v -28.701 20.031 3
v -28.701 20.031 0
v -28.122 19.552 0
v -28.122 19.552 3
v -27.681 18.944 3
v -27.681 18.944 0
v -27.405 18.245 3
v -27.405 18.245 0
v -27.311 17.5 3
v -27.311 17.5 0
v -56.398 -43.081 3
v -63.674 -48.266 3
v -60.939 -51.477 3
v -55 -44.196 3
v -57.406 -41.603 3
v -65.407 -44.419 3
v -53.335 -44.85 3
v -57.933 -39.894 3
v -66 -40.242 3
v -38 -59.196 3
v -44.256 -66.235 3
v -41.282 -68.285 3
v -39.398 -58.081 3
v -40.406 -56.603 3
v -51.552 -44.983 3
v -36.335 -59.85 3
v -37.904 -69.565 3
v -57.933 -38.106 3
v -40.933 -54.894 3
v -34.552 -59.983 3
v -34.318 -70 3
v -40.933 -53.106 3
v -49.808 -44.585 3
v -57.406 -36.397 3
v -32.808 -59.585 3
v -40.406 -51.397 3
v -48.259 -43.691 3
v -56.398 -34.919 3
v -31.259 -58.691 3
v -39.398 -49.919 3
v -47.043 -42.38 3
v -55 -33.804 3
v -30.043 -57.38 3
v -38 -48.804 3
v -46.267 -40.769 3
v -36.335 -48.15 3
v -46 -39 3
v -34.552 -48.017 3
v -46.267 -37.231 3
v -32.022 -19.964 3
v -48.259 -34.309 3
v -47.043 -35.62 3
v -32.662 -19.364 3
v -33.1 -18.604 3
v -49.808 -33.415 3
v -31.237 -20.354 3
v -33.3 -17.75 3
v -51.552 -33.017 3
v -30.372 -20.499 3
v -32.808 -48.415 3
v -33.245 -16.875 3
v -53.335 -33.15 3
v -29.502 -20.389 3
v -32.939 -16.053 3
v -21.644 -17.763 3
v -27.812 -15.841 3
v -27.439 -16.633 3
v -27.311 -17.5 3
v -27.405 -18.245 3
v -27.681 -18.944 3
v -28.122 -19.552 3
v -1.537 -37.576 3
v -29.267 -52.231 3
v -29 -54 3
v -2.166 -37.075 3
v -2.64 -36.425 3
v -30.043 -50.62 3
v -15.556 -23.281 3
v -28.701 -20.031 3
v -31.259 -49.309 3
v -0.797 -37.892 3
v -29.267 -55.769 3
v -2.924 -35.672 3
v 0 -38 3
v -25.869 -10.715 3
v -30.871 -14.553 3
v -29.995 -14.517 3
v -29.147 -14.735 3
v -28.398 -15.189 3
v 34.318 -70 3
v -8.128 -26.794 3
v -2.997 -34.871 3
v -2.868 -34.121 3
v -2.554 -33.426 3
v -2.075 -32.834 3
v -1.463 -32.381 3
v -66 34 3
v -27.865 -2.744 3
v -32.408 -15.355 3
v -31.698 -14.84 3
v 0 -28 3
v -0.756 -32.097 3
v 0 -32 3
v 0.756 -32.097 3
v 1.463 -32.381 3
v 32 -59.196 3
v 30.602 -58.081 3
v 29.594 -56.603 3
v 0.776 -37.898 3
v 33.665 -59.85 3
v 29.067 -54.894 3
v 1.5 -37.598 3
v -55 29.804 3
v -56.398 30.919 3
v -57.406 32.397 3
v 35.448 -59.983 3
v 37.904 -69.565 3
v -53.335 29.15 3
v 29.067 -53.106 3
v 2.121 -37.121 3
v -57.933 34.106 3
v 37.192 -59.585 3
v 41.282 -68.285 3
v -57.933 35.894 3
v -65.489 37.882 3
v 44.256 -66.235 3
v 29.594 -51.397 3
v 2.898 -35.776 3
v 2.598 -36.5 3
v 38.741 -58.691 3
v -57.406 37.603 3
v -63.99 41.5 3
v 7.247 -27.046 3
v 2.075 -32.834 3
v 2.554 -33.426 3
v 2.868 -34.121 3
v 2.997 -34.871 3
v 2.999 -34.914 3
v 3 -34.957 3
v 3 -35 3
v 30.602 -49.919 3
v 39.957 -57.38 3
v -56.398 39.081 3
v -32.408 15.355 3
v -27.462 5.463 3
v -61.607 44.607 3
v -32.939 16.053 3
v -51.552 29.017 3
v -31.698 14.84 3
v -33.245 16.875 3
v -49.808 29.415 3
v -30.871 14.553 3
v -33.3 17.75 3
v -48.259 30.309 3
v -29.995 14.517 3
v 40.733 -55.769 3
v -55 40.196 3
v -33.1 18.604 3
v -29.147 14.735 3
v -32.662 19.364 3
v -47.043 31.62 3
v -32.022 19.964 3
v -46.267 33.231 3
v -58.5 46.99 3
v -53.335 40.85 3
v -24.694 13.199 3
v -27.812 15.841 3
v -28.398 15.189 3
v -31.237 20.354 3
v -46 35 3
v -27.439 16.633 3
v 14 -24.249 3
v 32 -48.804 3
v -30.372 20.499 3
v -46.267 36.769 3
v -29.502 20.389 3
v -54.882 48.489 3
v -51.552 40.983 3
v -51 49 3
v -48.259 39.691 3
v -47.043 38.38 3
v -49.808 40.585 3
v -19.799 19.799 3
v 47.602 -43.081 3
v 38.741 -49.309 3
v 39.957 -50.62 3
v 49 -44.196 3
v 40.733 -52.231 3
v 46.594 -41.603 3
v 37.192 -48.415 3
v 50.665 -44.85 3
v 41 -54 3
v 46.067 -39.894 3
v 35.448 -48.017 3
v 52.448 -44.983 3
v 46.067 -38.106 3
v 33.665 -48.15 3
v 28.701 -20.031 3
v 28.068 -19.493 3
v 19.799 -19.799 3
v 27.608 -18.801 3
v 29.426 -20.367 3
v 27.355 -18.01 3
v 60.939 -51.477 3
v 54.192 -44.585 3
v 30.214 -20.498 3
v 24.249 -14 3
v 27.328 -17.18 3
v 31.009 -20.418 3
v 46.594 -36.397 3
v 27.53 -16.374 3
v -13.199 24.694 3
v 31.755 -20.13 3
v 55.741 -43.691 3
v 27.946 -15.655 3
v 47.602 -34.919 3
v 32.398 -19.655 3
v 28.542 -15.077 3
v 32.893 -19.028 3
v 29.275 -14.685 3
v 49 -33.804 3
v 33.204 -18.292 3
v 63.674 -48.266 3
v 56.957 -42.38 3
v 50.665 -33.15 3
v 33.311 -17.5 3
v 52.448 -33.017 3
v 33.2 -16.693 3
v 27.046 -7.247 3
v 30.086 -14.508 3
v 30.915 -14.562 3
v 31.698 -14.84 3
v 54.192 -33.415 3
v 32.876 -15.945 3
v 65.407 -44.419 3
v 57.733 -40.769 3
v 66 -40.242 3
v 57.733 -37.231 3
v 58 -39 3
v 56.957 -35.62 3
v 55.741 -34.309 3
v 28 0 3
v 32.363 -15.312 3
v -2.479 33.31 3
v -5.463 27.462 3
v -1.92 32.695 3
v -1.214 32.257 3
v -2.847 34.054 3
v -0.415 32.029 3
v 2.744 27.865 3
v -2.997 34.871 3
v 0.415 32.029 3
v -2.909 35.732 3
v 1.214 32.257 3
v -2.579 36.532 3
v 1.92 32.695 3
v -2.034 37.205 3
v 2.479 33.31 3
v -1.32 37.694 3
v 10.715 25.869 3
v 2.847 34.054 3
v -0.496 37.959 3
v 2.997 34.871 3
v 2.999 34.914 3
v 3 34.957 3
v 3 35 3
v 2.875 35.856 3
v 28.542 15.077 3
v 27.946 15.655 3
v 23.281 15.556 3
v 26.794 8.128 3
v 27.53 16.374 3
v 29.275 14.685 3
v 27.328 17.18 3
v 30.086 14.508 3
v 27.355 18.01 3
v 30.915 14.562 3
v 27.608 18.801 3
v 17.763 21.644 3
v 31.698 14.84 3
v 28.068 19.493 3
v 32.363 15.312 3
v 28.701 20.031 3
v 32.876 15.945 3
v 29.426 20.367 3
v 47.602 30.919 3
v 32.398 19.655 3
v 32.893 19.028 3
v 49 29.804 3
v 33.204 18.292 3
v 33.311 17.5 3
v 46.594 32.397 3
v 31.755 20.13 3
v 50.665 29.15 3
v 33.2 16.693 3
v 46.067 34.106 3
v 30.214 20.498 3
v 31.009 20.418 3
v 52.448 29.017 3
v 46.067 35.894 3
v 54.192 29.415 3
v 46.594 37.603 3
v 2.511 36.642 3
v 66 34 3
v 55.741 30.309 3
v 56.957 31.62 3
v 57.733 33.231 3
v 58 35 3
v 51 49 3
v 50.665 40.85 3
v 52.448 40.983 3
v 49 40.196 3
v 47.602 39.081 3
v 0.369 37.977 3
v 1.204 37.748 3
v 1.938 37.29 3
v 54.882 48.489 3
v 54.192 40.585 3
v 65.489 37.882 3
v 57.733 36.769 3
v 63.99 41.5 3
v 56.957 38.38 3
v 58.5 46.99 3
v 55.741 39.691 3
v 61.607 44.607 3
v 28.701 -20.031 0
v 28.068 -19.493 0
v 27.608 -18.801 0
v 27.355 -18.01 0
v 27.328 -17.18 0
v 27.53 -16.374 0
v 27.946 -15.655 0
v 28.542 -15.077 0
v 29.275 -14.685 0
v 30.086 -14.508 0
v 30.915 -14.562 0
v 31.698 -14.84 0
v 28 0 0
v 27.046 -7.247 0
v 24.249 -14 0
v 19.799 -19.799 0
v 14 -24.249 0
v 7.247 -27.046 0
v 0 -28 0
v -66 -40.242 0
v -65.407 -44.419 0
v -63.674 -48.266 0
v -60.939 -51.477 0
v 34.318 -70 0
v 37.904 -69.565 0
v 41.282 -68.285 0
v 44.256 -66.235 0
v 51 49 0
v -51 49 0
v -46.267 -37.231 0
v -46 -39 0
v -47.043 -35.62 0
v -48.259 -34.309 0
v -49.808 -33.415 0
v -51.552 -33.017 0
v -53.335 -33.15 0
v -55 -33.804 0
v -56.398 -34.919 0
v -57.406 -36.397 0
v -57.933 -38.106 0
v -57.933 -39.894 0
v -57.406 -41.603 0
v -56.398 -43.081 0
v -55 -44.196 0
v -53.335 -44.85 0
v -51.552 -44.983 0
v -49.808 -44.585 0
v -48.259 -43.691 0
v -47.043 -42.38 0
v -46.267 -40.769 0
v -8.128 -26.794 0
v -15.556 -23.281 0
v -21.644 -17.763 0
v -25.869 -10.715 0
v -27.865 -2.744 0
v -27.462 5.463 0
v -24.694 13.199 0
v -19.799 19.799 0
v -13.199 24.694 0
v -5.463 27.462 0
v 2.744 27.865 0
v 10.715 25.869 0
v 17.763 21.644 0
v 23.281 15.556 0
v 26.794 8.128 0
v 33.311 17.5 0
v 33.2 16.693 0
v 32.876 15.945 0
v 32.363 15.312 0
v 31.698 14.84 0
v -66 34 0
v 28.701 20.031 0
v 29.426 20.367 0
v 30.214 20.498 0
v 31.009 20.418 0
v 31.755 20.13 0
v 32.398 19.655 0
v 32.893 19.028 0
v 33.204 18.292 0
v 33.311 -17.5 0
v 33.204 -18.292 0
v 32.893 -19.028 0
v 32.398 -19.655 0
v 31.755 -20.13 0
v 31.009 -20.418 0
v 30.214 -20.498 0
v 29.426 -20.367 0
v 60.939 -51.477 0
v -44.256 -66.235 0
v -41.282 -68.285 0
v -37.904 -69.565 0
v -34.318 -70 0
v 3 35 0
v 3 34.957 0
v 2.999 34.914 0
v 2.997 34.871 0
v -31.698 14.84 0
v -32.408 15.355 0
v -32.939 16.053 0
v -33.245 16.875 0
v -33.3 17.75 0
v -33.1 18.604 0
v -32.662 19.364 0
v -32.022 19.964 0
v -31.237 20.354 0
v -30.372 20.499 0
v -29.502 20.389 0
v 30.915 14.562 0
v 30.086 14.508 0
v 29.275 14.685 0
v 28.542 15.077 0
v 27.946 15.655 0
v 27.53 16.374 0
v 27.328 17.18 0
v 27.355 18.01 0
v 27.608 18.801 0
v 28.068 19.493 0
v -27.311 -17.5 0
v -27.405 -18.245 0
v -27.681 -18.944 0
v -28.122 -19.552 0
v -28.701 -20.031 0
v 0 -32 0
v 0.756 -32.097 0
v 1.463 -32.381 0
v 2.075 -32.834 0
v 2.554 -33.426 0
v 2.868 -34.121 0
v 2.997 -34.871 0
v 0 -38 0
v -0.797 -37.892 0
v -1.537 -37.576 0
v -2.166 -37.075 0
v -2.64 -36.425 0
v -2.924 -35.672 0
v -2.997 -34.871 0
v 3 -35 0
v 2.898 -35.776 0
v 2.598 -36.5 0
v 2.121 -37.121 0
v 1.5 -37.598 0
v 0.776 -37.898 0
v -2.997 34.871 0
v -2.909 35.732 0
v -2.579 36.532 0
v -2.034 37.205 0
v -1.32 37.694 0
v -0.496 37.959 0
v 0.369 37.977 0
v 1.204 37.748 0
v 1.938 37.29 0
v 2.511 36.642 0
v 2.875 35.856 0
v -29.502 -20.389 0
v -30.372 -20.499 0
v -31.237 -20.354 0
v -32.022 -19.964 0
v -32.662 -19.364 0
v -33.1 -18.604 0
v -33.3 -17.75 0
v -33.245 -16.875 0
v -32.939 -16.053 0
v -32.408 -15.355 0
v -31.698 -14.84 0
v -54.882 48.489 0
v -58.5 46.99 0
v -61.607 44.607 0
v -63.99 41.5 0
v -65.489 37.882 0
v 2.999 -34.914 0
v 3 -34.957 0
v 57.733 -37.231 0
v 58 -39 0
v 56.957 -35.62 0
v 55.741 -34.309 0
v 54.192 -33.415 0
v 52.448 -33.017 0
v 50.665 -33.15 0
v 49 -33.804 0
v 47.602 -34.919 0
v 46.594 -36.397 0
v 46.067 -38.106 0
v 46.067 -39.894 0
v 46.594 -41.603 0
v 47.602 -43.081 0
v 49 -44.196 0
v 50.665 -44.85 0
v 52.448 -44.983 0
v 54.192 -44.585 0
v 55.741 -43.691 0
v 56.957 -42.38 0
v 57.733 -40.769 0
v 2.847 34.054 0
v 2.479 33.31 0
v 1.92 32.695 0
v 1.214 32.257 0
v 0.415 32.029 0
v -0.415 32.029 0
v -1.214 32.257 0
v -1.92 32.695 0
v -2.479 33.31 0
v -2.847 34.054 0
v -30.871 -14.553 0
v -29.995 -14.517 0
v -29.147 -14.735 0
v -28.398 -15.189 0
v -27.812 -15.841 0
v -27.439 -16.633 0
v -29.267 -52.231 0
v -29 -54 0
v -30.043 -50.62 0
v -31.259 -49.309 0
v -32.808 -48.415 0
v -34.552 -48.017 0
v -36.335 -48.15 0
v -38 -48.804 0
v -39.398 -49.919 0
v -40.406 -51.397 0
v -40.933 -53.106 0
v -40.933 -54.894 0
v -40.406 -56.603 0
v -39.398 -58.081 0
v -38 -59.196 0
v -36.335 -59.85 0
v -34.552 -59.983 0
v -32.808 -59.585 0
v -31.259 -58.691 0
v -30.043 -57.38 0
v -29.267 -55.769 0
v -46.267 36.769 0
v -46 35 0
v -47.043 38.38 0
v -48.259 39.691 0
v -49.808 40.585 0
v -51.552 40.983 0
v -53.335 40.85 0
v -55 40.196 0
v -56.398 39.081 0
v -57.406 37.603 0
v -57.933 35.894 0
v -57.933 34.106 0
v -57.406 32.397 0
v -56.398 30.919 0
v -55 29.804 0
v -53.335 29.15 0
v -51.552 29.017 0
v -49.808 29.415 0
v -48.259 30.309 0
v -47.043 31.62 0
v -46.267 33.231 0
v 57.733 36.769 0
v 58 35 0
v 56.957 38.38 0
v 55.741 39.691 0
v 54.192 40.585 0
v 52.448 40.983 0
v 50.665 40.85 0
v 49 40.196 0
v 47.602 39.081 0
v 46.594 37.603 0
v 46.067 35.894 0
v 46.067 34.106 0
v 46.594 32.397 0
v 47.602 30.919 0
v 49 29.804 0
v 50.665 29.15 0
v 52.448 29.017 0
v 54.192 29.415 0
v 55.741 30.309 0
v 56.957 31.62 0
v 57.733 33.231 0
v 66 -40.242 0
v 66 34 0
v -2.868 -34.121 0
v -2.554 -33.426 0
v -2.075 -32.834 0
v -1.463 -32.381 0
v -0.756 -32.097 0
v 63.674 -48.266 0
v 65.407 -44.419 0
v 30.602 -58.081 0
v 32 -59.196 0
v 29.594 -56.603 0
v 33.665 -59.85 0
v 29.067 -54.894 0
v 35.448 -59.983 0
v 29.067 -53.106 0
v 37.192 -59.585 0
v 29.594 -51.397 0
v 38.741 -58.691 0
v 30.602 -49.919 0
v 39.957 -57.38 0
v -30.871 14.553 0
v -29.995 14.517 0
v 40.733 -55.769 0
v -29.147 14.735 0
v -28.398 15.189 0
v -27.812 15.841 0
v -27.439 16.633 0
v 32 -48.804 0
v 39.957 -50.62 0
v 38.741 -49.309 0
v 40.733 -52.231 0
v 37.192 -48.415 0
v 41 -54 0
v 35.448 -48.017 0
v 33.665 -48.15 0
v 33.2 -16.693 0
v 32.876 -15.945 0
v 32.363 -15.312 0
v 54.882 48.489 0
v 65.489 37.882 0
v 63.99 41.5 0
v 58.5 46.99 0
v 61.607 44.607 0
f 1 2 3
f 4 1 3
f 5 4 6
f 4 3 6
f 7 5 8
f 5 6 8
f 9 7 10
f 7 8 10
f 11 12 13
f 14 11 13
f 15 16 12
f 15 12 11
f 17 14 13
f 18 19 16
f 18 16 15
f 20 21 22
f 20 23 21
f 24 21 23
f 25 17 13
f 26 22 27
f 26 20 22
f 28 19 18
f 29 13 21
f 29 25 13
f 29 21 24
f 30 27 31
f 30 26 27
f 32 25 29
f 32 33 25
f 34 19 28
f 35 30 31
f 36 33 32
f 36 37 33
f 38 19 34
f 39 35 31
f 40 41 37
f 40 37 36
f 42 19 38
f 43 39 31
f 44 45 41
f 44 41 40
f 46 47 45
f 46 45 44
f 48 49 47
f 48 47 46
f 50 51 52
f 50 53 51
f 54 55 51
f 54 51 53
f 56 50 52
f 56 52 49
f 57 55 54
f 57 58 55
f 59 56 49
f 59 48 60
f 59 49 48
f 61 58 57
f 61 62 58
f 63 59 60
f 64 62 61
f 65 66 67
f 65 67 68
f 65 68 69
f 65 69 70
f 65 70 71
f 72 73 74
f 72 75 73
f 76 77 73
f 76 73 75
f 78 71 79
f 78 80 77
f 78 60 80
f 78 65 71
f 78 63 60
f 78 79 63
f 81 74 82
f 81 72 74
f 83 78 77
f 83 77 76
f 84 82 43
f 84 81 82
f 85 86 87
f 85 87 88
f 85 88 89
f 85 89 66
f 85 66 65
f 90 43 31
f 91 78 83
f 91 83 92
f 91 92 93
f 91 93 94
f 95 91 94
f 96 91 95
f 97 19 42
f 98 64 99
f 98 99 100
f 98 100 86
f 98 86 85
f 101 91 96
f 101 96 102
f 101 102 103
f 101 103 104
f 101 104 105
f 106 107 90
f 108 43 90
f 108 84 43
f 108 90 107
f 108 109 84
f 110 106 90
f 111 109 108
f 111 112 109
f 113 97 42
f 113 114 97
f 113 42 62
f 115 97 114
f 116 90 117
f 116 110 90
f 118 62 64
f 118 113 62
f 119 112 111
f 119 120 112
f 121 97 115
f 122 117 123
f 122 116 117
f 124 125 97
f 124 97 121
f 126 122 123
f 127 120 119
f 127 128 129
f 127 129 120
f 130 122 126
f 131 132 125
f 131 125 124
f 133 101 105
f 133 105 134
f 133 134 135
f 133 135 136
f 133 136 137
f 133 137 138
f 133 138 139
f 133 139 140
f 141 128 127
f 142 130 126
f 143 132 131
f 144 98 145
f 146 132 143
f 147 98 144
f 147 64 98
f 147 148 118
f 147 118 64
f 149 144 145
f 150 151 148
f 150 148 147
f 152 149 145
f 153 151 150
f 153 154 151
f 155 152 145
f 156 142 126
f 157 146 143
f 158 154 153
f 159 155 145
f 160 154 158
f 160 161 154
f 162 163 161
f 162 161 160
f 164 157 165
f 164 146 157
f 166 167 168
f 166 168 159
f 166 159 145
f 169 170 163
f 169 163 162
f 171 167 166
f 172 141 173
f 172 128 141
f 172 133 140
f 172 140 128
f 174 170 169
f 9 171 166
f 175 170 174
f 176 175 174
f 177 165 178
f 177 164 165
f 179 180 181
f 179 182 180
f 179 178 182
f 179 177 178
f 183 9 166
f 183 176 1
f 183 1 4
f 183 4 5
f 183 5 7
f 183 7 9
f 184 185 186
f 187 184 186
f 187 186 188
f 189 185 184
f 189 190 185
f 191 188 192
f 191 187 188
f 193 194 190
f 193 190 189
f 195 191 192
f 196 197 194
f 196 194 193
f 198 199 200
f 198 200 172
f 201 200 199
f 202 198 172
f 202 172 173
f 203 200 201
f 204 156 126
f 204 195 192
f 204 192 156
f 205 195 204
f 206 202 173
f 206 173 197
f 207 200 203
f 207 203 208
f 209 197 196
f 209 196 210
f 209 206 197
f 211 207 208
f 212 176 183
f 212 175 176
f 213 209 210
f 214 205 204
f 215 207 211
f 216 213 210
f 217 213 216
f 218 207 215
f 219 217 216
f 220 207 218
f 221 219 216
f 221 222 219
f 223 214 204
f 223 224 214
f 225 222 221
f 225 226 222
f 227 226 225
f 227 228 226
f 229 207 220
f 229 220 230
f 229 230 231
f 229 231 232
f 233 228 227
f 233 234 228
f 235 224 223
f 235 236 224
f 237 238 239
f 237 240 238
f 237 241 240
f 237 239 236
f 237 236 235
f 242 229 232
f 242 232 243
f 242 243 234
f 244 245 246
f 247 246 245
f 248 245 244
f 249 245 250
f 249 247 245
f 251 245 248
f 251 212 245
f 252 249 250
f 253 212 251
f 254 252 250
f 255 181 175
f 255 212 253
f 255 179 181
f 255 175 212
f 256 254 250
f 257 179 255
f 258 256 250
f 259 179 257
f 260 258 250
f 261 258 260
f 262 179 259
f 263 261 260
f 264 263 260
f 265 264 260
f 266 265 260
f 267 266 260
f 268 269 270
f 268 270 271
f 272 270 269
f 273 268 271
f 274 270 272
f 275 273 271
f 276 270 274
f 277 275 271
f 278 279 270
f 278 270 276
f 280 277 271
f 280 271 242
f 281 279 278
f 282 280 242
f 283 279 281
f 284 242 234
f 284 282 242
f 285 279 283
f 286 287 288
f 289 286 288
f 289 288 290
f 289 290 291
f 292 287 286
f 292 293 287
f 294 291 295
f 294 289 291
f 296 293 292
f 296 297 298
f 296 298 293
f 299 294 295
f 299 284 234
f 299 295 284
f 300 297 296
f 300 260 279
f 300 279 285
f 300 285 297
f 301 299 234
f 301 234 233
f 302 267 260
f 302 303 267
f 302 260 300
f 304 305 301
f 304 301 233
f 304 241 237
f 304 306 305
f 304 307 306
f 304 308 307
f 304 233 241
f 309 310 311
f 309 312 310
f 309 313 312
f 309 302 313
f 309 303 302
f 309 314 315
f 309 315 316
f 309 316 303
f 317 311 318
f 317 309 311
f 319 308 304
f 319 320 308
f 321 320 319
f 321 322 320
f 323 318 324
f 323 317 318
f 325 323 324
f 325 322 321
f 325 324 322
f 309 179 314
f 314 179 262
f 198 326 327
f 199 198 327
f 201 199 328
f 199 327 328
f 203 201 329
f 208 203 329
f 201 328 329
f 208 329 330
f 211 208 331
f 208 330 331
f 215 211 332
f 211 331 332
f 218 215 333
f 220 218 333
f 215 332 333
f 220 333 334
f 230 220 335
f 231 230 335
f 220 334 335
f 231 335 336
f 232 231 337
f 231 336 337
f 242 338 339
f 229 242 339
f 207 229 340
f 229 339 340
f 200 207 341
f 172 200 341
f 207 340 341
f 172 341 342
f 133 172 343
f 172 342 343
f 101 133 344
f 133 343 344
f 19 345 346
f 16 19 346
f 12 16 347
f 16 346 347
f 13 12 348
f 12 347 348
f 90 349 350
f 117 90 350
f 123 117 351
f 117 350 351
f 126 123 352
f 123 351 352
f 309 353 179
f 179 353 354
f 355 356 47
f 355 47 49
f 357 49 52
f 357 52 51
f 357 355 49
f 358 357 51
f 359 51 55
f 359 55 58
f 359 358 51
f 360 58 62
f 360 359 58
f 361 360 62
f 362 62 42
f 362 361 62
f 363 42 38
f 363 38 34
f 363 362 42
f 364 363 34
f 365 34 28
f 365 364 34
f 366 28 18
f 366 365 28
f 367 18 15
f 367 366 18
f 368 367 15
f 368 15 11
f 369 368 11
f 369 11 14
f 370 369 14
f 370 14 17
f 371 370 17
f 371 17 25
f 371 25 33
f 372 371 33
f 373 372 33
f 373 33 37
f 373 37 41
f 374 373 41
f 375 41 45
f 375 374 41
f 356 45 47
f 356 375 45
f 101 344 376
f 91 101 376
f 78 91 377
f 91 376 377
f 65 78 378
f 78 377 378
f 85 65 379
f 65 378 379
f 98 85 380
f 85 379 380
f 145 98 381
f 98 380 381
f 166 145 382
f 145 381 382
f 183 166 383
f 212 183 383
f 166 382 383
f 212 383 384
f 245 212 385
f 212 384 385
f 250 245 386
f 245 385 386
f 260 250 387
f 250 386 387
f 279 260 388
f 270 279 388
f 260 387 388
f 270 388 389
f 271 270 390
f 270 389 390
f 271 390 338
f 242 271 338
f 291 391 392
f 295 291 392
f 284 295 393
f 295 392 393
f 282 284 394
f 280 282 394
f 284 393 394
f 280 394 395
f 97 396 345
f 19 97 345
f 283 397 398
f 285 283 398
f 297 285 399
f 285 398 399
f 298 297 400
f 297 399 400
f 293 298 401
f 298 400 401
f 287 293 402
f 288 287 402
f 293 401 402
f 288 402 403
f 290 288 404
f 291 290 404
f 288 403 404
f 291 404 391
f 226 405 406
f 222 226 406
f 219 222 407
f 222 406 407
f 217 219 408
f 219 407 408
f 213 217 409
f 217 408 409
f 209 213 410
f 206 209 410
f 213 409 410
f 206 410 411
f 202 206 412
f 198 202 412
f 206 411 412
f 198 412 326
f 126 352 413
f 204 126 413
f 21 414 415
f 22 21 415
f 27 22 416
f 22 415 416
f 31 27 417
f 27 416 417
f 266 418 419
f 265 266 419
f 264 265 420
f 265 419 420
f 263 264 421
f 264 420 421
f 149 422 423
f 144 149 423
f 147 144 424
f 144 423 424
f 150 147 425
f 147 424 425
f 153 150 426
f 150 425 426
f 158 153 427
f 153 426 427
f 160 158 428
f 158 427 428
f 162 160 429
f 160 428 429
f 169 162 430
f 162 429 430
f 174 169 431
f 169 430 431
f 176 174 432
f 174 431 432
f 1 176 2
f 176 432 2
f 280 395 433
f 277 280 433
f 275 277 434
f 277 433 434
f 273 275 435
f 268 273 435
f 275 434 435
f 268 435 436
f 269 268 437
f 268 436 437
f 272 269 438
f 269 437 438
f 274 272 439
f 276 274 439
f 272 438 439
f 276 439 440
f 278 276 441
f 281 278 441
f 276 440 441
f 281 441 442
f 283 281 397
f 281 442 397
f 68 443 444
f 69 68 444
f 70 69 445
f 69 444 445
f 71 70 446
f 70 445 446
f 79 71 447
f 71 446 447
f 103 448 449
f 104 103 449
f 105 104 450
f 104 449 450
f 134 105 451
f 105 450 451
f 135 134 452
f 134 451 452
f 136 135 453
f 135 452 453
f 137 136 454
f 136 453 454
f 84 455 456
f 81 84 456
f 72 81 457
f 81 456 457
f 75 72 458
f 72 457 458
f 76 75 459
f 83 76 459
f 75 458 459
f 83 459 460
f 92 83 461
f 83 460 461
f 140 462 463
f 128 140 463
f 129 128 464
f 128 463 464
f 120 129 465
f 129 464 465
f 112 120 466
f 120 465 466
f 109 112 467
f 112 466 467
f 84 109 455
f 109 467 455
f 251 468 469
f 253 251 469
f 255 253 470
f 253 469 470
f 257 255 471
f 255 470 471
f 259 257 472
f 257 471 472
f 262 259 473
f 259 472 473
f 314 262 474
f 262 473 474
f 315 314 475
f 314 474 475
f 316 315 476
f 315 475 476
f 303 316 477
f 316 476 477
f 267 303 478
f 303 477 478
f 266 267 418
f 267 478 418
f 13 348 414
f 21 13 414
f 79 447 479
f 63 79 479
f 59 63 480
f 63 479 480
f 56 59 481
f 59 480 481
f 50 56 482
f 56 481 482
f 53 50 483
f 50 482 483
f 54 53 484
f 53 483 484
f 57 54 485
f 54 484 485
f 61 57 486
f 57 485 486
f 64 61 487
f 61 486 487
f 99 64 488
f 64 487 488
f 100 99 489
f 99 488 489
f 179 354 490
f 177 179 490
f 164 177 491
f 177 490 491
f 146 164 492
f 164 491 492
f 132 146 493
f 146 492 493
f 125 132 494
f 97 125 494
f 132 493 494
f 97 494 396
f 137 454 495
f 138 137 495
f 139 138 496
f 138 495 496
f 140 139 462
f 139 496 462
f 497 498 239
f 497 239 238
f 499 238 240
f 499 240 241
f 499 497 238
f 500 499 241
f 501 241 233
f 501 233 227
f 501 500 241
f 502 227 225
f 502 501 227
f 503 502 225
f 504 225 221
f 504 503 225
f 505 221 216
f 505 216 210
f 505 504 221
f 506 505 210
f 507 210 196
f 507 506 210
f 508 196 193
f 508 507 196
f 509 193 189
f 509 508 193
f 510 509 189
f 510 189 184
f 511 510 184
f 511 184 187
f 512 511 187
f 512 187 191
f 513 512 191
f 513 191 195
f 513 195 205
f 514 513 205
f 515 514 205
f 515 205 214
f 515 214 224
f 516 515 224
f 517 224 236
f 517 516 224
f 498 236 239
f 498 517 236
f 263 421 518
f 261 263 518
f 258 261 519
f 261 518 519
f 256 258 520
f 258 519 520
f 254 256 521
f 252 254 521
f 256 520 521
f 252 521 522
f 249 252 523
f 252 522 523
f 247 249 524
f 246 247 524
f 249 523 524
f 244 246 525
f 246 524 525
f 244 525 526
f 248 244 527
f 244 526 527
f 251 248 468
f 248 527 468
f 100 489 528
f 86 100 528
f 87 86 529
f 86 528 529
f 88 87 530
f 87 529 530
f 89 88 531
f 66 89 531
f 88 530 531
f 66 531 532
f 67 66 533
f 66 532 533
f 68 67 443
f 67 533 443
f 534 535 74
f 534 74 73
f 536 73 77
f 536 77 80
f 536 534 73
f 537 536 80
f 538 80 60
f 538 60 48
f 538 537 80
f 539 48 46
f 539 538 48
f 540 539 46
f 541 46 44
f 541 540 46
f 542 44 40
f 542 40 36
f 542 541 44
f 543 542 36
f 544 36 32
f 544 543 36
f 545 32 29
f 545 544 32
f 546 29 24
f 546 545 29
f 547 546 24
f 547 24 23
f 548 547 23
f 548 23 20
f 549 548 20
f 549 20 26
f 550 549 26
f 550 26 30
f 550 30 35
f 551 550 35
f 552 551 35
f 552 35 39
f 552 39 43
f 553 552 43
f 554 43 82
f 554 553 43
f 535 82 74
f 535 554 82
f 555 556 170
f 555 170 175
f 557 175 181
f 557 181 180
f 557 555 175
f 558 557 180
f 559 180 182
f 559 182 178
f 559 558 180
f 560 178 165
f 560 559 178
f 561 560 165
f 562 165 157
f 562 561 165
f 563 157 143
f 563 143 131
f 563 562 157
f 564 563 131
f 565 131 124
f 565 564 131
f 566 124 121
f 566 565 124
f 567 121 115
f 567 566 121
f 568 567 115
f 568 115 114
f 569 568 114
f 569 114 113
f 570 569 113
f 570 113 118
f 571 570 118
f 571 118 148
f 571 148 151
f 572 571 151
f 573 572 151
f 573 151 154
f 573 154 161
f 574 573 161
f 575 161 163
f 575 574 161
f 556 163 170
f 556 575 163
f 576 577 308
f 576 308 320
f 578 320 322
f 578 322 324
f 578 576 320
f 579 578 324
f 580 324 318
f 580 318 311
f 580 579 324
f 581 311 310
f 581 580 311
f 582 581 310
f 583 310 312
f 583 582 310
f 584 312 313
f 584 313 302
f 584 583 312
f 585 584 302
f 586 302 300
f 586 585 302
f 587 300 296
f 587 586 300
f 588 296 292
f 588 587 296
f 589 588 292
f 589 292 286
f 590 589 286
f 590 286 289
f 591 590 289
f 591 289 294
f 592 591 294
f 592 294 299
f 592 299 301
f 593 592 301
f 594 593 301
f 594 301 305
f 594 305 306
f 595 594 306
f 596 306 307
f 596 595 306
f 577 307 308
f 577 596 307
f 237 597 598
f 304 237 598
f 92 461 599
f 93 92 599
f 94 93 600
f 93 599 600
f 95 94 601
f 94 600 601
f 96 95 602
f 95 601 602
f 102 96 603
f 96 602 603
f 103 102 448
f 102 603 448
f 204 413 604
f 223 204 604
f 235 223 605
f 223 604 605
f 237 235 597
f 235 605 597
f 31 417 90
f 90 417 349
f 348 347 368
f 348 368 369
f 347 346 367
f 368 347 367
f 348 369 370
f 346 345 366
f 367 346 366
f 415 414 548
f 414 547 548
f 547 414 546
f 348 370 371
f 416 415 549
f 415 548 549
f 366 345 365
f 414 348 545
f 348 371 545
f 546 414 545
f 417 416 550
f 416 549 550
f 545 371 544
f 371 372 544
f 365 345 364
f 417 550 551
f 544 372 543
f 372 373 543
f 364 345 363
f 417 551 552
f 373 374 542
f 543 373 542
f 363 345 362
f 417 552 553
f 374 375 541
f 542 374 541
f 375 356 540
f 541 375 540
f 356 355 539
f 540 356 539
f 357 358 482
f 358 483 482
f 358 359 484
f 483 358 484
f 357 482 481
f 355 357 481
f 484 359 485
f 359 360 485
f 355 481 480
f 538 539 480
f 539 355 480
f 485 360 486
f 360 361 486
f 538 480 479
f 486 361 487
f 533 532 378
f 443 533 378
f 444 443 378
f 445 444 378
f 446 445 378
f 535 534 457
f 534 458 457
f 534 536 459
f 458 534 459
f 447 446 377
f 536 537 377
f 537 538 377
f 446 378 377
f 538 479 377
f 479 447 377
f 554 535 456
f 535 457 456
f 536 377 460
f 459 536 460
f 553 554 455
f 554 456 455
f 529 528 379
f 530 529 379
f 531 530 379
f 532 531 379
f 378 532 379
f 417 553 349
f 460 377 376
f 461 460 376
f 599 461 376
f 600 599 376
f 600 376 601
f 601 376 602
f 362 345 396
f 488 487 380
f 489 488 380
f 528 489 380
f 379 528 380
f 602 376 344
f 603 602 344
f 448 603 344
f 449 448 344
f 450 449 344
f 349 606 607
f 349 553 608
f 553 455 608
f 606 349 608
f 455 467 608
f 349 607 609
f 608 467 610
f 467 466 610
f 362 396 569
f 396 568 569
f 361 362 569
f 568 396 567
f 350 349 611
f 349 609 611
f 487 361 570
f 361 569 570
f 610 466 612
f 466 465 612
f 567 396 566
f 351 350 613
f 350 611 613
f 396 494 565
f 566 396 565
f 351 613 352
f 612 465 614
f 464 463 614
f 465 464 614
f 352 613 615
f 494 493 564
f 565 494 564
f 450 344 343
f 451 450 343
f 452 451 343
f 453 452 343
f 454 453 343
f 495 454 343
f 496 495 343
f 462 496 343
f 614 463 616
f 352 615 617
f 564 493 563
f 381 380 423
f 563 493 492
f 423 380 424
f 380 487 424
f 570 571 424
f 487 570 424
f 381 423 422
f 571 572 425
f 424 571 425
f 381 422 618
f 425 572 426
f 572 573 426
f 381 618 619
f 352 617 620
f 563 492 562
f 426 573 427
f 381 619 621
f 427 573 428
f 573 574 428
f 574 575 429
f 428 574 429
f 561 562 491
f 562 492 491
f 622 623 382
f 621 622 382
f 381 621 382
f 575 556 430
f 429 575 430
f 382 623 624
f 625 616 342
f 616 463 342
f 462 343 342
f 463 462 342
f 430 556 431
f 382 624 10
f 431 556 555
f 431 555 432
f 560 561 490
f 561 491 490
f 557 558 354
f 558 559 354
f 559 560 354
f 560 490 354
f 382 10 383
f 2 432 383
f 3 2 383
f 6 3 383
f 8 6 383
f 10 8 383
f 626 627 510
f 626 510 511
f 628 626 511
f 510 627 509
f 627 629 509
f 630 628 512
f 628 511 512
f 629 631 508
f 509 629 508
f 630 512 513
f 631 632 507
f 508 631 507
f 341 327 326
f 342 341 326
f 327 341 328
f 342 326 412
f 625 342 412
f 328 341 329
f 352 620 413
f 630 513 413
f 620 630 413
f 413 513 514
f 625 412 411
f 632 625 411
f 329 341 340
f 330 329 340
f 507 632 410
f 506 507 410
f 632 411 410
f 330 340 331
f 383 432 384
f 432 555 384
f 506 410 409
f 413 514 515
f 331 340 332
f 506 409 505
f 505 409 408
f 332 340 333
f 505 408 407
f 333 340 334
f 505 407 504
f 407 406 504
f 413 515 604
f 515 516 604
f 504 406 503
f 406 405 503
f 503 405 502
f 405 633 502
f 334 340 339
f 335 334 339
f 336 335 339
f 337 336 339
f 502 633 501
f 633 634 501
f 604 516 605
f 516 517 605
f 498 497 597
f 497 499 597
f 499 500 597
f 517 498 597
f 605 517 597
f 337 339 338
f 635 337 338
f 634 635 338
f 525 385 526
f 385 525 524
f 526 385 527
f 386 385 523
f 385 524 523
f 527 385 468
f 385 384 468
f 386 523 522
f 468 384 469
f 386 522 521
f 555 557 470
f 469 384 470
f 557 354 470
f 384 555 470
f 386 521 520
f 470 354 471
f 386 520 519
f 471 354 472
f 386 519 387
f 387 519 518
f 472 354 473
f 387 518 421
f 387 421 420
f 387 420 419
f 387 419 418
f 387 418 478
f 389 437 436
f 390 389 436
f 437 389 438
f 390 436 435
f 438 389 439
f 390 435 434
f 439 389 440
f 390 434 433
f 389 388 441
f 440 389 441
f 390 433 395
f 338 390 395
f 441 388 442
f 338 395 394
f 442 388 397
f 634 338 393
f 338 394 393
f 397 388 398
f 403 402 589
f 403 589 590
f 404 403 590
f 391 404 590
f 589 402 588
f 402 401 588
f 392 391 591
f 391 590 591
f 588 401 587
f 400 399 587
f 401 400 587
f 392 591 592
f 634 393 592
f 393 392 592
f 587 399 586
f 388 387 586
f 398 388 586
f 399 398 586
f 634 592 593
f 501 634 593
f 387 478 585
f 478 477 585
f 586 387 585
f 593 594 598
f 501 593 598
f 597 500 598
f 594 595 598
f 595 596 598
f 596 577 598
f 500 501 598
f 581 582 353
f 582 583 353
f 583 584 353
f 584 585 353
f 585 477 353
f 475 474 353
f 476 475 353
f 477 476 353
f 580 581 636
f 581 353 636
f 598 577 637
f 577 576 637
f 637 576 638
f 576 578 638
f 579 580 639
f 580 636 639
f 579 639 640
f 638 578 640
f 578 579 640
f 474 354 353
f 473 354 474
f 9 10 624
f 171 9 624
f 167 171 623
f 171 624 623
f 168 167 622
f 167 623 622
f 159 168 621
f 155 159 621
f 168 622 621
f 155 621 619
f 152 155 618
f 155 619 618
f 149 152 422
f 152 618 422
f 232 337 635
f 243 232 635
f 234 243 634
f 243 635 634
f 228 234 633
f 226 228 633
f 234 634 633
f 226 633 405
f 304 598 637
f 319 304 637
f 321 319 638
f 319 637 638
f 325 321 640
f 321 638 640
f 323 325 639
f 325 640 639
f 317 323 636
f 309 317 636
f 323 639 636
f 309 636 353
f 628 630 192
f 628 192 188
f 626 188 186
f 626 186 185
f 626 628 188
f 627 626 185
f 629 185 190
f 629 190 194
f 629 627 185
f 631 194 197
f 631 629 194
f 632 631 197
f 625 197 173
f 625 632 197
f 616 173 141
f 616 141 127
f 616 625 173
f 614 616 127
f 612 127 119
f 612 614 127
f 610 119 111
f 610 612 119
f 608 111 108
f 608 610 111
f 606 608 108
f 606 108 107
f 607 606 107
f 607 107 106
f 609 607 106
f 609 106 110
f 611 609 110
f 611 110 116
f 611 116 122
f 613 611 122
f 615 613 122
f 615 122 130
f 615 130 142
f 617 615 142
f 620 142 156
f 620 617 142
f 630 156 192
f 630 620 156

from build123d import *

# Parameters (mm, degrees)
F0_R     = 9
F0_R_2   = 6
F1_DEPTH = 3


# Not quite as in the source:
# - a feature names something its author has since deleted; it is built from what else it names


with BuildPart() as f1:
    # F0 (on Top) → F1 (new body)
    with BuildSketch(Plane.XY):
        with BuildLine():
            ThreePointArc((0, 49), (-49, 0), (0, -49))
            ThreePointArc((0, -49), (34.6482322781, -34.6482322781), (49, 0))
            ThreePointArc((49, 0), (34.6482322781, 34.6482322781), (0, 49))
        make_face()
        with BuildLine():
            ThreePointArc((31.698164825, 14.8400251593), (34.1645706023, 7.601454832), (35, 0))
            ThreePointArc((35, 0), (34.1645706023, -7.601454832), (31.698164825, -14.8400251593))
            ThreePointArc((31.698164825, -14.8400251593), (32.8762182612, -15.9446587316), (33.3108891325, -17.5))
            ThreePointArc((33.3108891325, -17.5), (31.7548586928, -20.1296296144), (28.7009211933, -20.0314034121))
            ThreePointArc((28.7009211933, -20.0314034121), (17.5, -30.3108891325), (2.9972436317, -34.8714285714))
            ThreePointArc((2.9972436317, -34.8714285714), (2.9993108288, -34.9356995144), (3, -35))
            ThreePointArc((3, -35), (2.1213203436, -37.1213203436), (0, -38))
            ThreePointArc((0, -38), (-2.1663003353, -37.0753657165), (-2.9972436317, -34.8714285714))
            ThreePointArc((-2.9972436317, -34.8714285714), (-17.5, -30.3108891325), (-28.7009211933, -20.0314034121))
            ThreePointArc((-28.7009211933, -20.0314034121), (-32.9089653438, -19), (-31.698164825, -14.8400251593))
            ThreePointArc((-31.698164825, -14.8400251593), (-35, 0), (-31.698164825, 14.8400251593))
            ThreePointArc((-31.698164825, 14.8400251593), (-32.9089653438, 19), (-28.7009211933, 20.0314034121))
            ThreePointArc((-28.7009211933, 20.0314034121), (-17.5, 30.3108891325), (-2.9972436317, 34.8714285714))
            ThreePointArc((-2.9972436317, 34.8714285714), (-0.0643004856, 37.9993108288), (3, 35))
            ThreePointArc((3, 35), (2.9993108288, 34.9356995144), (2.9972436317, 34.8714285714))
            ThreePointArc((2.9972436317, 34.8714285714), (17.5, 30.3108891325), (28.7009211933, 20.0314034121))
            ThreePointArc((28.7009211933, 20.0314034121), (31.7548586928, 20.1296296144), (33.3108891325, 17.5))
            ThreePointArc((33.3108891325, 17.5), (32.8762182612, 15.9446587316), (31.698164825, 14.8400251593))
        make_face(mode=Mode.SUBTRACT)
        with BuildLine():
            ThreePointArc((31.698164825, -14.8400251593), (34.1645706023, -7.601454832), (35, 0))
            ThreePointArc((35, 0), (34.1645706023, 7.601454832), (31.698164825, 14.8400251593))
            ThreePointArc((31.698164825, 14.8400251593), (27.7128129211, 16), (28.7009211933, 20.0314034121))
            ThreePointArc((28.7009211933, 20.0314034121), (17.5, 30.3108891325), (2.9972436317, 34.8714285714))
            ThreePointArc((2.9972436317, 34.8714285714), (0, 32), (-2.9972436317, 34.8714285714))
            ThreePointArc((-2.9972436317, 34.8714285714), (-17.5, 30.3108891325), (-28.7009211933, 20.0314034121))
            ThreePointArc((-28.7009211933, 20.0314034121), (-27.6812595181, 18.9439695603), (-27.3108891325, 17.5))
            ThreePointArc((-27.3108891325, 17.5), (-28.755547864, 14.9346708713), (-31.698164825, 14.8400251593))
            ThreePointArc((-31.698164825, 14.8400251593), (-35, 0), (-31.698164825, -14.8400251593))
            ThreePointArc((-31.698164825, -14.8400251593), (-28.755547864, -14.9346708713), (-27.3108891325, -17.5))
            ThreePointArc((-27.3108891325, -17.5), (-27.6812595181, -18.9439695603), (-28.7009211933, -20.0314034121))
            ThreePointArc((-28.7009211933, -20.0314034121), (-17.5, -30.3108891325), (-2.9972436317, -34.8714285714))
            ThreePointArc((-2.9972436317, -34.8714285714), (-2.0753657165, -32.8336996647), (0, -32))
            ThreePointArc((0, -32), (2.0753657165, -32.8336996647), (2.9972436317, -34.8714285714))
            ThreePointArc((2.9972436317, -34.8714285714), (17.5, -30.3108891325), (28.7009211933, -20.0314034121))
            ThreePointArc((28.7009211933, -20.0314034121), (27.7128129211, -16), (31.698164825, -14.8400251593))
        make_face()
        with BuildLine():
            ThreePointArc((28, 0), (19.7989898732, -19.7989898732), (0, -28))
            ThreePointArc((0, -28), (-19.7989898732, 19.7989898732), (28, 0))
        make_face(mode=Mode.SUBTRACT)
        with BuildLine():
            Line((0, -70), (0, -49))
            ThreePointArc((0, -49), (-49, 0), (0, 49))
            Line((0, 49), (-51, 49))
            ThreePointArc((-51, 49), (-61.6066017178, 44.6066017178), (-66, 34))
            Line((-66, 34), (-66, -40.2424365873))
            ThreePointArc((-66, -40.2424365873), (-64.6762407754, -46.4036408731), (-60.938608233, -51.4773850246))
            Line((-60.938608233, -51.4773850246), (-44.2561452447, -66.2349484374))
            ThreePointArc((-44.2561452447, -66.2349484374), (-39.6314702743, -69.0271919243), (-34.3175370117, -70))
            Line((-34.3175370117, -70), (0, -70))
        make_face()
        with Locations((-35, -54)):
            Circle(F0_R, mode=Mode.SUBTRACT)
        with Locations((-52, -39)):
            Circle(F0_R, mode=Mode.SUBTRACT)
        with Locations((-52, 35)):
            Circle(F0_R, mode=Mode.SUBTRACT)
        with BuildLine():
            ThreePointArc((49, 0), (34.6482322781, -34.6482322781), (0, -49))
            Line((0, -49), (0, -70))
            Line((0, -70), (34.3175370117, -70))
            ThreePointArc((34.3175370117, -70), (39.6314702743, -69.0271919243), (44.2561452447, -66.2349484374))
            Line((44.2561452447, -66.2349484374), (60.938608233, -51.4773850246))
            ThreePointArc((60.938608233, -51.4773850246), (64.6762407754, -46.4036408731), (66, -40.2424365873))
            Line((66, -40.2424365873), (66, 34))
            ThreePointArc((66, 34), (61.6066017178, 44.6066017178), (51, 49))
            Line((51, 49), (0, 49))
            ThreePointArc((0, 49), (34.6482322781, 34.6482322781), (49, 0))
        make_face()
        with Locations((35, -54)):
            Circle(F0_R, mode=Mode.SUBTRACT)
        with Locations((52, -39)):
            Circle(F0_R, mode=Mode.SUBTRACT)
        with Locations((52, 35)):
            Circle(F0_R, mode=Mode.SUBTRACT)
        with Locations((-52, 35)):
            Circle(F0_R)
        with Locations((-52, 35)):
            Circle(F0_R_2, mode=Mode.SUBTRACT)
        with Locations((-52, -39)):
            Circle(F0_R)
        with Locations((-52, -39)):
            Circle(F0_R_2, mode=Mode.SUBTRACT)
        with Locations((-35, -54)):
            Circle(F0_R)
        with Locations((-35, -54)):
            Circle(F0_R_2, mode=Mode.SUBTRACT)
        with Locations((35, -54)):
            Circle(F0_R)
        with Locations((35, -54)):
            Circle(F0_R_2, mode=Mode.SUBTRACT)
        with Locations((52, -39)):
            Circle(F0_R)
        with Locations((52, -39)):
            Circle(F0_R_2, mode=Mode.SUBTRACT)
        with Locations((52, 35)):
            Circle(F0_R)
        with Locations((52, 35)):
            Circle(F0_R_2, mode=Mode.SUBTRACT)
    extrude(amount=F1_DEPTH)


solid = f1.part
